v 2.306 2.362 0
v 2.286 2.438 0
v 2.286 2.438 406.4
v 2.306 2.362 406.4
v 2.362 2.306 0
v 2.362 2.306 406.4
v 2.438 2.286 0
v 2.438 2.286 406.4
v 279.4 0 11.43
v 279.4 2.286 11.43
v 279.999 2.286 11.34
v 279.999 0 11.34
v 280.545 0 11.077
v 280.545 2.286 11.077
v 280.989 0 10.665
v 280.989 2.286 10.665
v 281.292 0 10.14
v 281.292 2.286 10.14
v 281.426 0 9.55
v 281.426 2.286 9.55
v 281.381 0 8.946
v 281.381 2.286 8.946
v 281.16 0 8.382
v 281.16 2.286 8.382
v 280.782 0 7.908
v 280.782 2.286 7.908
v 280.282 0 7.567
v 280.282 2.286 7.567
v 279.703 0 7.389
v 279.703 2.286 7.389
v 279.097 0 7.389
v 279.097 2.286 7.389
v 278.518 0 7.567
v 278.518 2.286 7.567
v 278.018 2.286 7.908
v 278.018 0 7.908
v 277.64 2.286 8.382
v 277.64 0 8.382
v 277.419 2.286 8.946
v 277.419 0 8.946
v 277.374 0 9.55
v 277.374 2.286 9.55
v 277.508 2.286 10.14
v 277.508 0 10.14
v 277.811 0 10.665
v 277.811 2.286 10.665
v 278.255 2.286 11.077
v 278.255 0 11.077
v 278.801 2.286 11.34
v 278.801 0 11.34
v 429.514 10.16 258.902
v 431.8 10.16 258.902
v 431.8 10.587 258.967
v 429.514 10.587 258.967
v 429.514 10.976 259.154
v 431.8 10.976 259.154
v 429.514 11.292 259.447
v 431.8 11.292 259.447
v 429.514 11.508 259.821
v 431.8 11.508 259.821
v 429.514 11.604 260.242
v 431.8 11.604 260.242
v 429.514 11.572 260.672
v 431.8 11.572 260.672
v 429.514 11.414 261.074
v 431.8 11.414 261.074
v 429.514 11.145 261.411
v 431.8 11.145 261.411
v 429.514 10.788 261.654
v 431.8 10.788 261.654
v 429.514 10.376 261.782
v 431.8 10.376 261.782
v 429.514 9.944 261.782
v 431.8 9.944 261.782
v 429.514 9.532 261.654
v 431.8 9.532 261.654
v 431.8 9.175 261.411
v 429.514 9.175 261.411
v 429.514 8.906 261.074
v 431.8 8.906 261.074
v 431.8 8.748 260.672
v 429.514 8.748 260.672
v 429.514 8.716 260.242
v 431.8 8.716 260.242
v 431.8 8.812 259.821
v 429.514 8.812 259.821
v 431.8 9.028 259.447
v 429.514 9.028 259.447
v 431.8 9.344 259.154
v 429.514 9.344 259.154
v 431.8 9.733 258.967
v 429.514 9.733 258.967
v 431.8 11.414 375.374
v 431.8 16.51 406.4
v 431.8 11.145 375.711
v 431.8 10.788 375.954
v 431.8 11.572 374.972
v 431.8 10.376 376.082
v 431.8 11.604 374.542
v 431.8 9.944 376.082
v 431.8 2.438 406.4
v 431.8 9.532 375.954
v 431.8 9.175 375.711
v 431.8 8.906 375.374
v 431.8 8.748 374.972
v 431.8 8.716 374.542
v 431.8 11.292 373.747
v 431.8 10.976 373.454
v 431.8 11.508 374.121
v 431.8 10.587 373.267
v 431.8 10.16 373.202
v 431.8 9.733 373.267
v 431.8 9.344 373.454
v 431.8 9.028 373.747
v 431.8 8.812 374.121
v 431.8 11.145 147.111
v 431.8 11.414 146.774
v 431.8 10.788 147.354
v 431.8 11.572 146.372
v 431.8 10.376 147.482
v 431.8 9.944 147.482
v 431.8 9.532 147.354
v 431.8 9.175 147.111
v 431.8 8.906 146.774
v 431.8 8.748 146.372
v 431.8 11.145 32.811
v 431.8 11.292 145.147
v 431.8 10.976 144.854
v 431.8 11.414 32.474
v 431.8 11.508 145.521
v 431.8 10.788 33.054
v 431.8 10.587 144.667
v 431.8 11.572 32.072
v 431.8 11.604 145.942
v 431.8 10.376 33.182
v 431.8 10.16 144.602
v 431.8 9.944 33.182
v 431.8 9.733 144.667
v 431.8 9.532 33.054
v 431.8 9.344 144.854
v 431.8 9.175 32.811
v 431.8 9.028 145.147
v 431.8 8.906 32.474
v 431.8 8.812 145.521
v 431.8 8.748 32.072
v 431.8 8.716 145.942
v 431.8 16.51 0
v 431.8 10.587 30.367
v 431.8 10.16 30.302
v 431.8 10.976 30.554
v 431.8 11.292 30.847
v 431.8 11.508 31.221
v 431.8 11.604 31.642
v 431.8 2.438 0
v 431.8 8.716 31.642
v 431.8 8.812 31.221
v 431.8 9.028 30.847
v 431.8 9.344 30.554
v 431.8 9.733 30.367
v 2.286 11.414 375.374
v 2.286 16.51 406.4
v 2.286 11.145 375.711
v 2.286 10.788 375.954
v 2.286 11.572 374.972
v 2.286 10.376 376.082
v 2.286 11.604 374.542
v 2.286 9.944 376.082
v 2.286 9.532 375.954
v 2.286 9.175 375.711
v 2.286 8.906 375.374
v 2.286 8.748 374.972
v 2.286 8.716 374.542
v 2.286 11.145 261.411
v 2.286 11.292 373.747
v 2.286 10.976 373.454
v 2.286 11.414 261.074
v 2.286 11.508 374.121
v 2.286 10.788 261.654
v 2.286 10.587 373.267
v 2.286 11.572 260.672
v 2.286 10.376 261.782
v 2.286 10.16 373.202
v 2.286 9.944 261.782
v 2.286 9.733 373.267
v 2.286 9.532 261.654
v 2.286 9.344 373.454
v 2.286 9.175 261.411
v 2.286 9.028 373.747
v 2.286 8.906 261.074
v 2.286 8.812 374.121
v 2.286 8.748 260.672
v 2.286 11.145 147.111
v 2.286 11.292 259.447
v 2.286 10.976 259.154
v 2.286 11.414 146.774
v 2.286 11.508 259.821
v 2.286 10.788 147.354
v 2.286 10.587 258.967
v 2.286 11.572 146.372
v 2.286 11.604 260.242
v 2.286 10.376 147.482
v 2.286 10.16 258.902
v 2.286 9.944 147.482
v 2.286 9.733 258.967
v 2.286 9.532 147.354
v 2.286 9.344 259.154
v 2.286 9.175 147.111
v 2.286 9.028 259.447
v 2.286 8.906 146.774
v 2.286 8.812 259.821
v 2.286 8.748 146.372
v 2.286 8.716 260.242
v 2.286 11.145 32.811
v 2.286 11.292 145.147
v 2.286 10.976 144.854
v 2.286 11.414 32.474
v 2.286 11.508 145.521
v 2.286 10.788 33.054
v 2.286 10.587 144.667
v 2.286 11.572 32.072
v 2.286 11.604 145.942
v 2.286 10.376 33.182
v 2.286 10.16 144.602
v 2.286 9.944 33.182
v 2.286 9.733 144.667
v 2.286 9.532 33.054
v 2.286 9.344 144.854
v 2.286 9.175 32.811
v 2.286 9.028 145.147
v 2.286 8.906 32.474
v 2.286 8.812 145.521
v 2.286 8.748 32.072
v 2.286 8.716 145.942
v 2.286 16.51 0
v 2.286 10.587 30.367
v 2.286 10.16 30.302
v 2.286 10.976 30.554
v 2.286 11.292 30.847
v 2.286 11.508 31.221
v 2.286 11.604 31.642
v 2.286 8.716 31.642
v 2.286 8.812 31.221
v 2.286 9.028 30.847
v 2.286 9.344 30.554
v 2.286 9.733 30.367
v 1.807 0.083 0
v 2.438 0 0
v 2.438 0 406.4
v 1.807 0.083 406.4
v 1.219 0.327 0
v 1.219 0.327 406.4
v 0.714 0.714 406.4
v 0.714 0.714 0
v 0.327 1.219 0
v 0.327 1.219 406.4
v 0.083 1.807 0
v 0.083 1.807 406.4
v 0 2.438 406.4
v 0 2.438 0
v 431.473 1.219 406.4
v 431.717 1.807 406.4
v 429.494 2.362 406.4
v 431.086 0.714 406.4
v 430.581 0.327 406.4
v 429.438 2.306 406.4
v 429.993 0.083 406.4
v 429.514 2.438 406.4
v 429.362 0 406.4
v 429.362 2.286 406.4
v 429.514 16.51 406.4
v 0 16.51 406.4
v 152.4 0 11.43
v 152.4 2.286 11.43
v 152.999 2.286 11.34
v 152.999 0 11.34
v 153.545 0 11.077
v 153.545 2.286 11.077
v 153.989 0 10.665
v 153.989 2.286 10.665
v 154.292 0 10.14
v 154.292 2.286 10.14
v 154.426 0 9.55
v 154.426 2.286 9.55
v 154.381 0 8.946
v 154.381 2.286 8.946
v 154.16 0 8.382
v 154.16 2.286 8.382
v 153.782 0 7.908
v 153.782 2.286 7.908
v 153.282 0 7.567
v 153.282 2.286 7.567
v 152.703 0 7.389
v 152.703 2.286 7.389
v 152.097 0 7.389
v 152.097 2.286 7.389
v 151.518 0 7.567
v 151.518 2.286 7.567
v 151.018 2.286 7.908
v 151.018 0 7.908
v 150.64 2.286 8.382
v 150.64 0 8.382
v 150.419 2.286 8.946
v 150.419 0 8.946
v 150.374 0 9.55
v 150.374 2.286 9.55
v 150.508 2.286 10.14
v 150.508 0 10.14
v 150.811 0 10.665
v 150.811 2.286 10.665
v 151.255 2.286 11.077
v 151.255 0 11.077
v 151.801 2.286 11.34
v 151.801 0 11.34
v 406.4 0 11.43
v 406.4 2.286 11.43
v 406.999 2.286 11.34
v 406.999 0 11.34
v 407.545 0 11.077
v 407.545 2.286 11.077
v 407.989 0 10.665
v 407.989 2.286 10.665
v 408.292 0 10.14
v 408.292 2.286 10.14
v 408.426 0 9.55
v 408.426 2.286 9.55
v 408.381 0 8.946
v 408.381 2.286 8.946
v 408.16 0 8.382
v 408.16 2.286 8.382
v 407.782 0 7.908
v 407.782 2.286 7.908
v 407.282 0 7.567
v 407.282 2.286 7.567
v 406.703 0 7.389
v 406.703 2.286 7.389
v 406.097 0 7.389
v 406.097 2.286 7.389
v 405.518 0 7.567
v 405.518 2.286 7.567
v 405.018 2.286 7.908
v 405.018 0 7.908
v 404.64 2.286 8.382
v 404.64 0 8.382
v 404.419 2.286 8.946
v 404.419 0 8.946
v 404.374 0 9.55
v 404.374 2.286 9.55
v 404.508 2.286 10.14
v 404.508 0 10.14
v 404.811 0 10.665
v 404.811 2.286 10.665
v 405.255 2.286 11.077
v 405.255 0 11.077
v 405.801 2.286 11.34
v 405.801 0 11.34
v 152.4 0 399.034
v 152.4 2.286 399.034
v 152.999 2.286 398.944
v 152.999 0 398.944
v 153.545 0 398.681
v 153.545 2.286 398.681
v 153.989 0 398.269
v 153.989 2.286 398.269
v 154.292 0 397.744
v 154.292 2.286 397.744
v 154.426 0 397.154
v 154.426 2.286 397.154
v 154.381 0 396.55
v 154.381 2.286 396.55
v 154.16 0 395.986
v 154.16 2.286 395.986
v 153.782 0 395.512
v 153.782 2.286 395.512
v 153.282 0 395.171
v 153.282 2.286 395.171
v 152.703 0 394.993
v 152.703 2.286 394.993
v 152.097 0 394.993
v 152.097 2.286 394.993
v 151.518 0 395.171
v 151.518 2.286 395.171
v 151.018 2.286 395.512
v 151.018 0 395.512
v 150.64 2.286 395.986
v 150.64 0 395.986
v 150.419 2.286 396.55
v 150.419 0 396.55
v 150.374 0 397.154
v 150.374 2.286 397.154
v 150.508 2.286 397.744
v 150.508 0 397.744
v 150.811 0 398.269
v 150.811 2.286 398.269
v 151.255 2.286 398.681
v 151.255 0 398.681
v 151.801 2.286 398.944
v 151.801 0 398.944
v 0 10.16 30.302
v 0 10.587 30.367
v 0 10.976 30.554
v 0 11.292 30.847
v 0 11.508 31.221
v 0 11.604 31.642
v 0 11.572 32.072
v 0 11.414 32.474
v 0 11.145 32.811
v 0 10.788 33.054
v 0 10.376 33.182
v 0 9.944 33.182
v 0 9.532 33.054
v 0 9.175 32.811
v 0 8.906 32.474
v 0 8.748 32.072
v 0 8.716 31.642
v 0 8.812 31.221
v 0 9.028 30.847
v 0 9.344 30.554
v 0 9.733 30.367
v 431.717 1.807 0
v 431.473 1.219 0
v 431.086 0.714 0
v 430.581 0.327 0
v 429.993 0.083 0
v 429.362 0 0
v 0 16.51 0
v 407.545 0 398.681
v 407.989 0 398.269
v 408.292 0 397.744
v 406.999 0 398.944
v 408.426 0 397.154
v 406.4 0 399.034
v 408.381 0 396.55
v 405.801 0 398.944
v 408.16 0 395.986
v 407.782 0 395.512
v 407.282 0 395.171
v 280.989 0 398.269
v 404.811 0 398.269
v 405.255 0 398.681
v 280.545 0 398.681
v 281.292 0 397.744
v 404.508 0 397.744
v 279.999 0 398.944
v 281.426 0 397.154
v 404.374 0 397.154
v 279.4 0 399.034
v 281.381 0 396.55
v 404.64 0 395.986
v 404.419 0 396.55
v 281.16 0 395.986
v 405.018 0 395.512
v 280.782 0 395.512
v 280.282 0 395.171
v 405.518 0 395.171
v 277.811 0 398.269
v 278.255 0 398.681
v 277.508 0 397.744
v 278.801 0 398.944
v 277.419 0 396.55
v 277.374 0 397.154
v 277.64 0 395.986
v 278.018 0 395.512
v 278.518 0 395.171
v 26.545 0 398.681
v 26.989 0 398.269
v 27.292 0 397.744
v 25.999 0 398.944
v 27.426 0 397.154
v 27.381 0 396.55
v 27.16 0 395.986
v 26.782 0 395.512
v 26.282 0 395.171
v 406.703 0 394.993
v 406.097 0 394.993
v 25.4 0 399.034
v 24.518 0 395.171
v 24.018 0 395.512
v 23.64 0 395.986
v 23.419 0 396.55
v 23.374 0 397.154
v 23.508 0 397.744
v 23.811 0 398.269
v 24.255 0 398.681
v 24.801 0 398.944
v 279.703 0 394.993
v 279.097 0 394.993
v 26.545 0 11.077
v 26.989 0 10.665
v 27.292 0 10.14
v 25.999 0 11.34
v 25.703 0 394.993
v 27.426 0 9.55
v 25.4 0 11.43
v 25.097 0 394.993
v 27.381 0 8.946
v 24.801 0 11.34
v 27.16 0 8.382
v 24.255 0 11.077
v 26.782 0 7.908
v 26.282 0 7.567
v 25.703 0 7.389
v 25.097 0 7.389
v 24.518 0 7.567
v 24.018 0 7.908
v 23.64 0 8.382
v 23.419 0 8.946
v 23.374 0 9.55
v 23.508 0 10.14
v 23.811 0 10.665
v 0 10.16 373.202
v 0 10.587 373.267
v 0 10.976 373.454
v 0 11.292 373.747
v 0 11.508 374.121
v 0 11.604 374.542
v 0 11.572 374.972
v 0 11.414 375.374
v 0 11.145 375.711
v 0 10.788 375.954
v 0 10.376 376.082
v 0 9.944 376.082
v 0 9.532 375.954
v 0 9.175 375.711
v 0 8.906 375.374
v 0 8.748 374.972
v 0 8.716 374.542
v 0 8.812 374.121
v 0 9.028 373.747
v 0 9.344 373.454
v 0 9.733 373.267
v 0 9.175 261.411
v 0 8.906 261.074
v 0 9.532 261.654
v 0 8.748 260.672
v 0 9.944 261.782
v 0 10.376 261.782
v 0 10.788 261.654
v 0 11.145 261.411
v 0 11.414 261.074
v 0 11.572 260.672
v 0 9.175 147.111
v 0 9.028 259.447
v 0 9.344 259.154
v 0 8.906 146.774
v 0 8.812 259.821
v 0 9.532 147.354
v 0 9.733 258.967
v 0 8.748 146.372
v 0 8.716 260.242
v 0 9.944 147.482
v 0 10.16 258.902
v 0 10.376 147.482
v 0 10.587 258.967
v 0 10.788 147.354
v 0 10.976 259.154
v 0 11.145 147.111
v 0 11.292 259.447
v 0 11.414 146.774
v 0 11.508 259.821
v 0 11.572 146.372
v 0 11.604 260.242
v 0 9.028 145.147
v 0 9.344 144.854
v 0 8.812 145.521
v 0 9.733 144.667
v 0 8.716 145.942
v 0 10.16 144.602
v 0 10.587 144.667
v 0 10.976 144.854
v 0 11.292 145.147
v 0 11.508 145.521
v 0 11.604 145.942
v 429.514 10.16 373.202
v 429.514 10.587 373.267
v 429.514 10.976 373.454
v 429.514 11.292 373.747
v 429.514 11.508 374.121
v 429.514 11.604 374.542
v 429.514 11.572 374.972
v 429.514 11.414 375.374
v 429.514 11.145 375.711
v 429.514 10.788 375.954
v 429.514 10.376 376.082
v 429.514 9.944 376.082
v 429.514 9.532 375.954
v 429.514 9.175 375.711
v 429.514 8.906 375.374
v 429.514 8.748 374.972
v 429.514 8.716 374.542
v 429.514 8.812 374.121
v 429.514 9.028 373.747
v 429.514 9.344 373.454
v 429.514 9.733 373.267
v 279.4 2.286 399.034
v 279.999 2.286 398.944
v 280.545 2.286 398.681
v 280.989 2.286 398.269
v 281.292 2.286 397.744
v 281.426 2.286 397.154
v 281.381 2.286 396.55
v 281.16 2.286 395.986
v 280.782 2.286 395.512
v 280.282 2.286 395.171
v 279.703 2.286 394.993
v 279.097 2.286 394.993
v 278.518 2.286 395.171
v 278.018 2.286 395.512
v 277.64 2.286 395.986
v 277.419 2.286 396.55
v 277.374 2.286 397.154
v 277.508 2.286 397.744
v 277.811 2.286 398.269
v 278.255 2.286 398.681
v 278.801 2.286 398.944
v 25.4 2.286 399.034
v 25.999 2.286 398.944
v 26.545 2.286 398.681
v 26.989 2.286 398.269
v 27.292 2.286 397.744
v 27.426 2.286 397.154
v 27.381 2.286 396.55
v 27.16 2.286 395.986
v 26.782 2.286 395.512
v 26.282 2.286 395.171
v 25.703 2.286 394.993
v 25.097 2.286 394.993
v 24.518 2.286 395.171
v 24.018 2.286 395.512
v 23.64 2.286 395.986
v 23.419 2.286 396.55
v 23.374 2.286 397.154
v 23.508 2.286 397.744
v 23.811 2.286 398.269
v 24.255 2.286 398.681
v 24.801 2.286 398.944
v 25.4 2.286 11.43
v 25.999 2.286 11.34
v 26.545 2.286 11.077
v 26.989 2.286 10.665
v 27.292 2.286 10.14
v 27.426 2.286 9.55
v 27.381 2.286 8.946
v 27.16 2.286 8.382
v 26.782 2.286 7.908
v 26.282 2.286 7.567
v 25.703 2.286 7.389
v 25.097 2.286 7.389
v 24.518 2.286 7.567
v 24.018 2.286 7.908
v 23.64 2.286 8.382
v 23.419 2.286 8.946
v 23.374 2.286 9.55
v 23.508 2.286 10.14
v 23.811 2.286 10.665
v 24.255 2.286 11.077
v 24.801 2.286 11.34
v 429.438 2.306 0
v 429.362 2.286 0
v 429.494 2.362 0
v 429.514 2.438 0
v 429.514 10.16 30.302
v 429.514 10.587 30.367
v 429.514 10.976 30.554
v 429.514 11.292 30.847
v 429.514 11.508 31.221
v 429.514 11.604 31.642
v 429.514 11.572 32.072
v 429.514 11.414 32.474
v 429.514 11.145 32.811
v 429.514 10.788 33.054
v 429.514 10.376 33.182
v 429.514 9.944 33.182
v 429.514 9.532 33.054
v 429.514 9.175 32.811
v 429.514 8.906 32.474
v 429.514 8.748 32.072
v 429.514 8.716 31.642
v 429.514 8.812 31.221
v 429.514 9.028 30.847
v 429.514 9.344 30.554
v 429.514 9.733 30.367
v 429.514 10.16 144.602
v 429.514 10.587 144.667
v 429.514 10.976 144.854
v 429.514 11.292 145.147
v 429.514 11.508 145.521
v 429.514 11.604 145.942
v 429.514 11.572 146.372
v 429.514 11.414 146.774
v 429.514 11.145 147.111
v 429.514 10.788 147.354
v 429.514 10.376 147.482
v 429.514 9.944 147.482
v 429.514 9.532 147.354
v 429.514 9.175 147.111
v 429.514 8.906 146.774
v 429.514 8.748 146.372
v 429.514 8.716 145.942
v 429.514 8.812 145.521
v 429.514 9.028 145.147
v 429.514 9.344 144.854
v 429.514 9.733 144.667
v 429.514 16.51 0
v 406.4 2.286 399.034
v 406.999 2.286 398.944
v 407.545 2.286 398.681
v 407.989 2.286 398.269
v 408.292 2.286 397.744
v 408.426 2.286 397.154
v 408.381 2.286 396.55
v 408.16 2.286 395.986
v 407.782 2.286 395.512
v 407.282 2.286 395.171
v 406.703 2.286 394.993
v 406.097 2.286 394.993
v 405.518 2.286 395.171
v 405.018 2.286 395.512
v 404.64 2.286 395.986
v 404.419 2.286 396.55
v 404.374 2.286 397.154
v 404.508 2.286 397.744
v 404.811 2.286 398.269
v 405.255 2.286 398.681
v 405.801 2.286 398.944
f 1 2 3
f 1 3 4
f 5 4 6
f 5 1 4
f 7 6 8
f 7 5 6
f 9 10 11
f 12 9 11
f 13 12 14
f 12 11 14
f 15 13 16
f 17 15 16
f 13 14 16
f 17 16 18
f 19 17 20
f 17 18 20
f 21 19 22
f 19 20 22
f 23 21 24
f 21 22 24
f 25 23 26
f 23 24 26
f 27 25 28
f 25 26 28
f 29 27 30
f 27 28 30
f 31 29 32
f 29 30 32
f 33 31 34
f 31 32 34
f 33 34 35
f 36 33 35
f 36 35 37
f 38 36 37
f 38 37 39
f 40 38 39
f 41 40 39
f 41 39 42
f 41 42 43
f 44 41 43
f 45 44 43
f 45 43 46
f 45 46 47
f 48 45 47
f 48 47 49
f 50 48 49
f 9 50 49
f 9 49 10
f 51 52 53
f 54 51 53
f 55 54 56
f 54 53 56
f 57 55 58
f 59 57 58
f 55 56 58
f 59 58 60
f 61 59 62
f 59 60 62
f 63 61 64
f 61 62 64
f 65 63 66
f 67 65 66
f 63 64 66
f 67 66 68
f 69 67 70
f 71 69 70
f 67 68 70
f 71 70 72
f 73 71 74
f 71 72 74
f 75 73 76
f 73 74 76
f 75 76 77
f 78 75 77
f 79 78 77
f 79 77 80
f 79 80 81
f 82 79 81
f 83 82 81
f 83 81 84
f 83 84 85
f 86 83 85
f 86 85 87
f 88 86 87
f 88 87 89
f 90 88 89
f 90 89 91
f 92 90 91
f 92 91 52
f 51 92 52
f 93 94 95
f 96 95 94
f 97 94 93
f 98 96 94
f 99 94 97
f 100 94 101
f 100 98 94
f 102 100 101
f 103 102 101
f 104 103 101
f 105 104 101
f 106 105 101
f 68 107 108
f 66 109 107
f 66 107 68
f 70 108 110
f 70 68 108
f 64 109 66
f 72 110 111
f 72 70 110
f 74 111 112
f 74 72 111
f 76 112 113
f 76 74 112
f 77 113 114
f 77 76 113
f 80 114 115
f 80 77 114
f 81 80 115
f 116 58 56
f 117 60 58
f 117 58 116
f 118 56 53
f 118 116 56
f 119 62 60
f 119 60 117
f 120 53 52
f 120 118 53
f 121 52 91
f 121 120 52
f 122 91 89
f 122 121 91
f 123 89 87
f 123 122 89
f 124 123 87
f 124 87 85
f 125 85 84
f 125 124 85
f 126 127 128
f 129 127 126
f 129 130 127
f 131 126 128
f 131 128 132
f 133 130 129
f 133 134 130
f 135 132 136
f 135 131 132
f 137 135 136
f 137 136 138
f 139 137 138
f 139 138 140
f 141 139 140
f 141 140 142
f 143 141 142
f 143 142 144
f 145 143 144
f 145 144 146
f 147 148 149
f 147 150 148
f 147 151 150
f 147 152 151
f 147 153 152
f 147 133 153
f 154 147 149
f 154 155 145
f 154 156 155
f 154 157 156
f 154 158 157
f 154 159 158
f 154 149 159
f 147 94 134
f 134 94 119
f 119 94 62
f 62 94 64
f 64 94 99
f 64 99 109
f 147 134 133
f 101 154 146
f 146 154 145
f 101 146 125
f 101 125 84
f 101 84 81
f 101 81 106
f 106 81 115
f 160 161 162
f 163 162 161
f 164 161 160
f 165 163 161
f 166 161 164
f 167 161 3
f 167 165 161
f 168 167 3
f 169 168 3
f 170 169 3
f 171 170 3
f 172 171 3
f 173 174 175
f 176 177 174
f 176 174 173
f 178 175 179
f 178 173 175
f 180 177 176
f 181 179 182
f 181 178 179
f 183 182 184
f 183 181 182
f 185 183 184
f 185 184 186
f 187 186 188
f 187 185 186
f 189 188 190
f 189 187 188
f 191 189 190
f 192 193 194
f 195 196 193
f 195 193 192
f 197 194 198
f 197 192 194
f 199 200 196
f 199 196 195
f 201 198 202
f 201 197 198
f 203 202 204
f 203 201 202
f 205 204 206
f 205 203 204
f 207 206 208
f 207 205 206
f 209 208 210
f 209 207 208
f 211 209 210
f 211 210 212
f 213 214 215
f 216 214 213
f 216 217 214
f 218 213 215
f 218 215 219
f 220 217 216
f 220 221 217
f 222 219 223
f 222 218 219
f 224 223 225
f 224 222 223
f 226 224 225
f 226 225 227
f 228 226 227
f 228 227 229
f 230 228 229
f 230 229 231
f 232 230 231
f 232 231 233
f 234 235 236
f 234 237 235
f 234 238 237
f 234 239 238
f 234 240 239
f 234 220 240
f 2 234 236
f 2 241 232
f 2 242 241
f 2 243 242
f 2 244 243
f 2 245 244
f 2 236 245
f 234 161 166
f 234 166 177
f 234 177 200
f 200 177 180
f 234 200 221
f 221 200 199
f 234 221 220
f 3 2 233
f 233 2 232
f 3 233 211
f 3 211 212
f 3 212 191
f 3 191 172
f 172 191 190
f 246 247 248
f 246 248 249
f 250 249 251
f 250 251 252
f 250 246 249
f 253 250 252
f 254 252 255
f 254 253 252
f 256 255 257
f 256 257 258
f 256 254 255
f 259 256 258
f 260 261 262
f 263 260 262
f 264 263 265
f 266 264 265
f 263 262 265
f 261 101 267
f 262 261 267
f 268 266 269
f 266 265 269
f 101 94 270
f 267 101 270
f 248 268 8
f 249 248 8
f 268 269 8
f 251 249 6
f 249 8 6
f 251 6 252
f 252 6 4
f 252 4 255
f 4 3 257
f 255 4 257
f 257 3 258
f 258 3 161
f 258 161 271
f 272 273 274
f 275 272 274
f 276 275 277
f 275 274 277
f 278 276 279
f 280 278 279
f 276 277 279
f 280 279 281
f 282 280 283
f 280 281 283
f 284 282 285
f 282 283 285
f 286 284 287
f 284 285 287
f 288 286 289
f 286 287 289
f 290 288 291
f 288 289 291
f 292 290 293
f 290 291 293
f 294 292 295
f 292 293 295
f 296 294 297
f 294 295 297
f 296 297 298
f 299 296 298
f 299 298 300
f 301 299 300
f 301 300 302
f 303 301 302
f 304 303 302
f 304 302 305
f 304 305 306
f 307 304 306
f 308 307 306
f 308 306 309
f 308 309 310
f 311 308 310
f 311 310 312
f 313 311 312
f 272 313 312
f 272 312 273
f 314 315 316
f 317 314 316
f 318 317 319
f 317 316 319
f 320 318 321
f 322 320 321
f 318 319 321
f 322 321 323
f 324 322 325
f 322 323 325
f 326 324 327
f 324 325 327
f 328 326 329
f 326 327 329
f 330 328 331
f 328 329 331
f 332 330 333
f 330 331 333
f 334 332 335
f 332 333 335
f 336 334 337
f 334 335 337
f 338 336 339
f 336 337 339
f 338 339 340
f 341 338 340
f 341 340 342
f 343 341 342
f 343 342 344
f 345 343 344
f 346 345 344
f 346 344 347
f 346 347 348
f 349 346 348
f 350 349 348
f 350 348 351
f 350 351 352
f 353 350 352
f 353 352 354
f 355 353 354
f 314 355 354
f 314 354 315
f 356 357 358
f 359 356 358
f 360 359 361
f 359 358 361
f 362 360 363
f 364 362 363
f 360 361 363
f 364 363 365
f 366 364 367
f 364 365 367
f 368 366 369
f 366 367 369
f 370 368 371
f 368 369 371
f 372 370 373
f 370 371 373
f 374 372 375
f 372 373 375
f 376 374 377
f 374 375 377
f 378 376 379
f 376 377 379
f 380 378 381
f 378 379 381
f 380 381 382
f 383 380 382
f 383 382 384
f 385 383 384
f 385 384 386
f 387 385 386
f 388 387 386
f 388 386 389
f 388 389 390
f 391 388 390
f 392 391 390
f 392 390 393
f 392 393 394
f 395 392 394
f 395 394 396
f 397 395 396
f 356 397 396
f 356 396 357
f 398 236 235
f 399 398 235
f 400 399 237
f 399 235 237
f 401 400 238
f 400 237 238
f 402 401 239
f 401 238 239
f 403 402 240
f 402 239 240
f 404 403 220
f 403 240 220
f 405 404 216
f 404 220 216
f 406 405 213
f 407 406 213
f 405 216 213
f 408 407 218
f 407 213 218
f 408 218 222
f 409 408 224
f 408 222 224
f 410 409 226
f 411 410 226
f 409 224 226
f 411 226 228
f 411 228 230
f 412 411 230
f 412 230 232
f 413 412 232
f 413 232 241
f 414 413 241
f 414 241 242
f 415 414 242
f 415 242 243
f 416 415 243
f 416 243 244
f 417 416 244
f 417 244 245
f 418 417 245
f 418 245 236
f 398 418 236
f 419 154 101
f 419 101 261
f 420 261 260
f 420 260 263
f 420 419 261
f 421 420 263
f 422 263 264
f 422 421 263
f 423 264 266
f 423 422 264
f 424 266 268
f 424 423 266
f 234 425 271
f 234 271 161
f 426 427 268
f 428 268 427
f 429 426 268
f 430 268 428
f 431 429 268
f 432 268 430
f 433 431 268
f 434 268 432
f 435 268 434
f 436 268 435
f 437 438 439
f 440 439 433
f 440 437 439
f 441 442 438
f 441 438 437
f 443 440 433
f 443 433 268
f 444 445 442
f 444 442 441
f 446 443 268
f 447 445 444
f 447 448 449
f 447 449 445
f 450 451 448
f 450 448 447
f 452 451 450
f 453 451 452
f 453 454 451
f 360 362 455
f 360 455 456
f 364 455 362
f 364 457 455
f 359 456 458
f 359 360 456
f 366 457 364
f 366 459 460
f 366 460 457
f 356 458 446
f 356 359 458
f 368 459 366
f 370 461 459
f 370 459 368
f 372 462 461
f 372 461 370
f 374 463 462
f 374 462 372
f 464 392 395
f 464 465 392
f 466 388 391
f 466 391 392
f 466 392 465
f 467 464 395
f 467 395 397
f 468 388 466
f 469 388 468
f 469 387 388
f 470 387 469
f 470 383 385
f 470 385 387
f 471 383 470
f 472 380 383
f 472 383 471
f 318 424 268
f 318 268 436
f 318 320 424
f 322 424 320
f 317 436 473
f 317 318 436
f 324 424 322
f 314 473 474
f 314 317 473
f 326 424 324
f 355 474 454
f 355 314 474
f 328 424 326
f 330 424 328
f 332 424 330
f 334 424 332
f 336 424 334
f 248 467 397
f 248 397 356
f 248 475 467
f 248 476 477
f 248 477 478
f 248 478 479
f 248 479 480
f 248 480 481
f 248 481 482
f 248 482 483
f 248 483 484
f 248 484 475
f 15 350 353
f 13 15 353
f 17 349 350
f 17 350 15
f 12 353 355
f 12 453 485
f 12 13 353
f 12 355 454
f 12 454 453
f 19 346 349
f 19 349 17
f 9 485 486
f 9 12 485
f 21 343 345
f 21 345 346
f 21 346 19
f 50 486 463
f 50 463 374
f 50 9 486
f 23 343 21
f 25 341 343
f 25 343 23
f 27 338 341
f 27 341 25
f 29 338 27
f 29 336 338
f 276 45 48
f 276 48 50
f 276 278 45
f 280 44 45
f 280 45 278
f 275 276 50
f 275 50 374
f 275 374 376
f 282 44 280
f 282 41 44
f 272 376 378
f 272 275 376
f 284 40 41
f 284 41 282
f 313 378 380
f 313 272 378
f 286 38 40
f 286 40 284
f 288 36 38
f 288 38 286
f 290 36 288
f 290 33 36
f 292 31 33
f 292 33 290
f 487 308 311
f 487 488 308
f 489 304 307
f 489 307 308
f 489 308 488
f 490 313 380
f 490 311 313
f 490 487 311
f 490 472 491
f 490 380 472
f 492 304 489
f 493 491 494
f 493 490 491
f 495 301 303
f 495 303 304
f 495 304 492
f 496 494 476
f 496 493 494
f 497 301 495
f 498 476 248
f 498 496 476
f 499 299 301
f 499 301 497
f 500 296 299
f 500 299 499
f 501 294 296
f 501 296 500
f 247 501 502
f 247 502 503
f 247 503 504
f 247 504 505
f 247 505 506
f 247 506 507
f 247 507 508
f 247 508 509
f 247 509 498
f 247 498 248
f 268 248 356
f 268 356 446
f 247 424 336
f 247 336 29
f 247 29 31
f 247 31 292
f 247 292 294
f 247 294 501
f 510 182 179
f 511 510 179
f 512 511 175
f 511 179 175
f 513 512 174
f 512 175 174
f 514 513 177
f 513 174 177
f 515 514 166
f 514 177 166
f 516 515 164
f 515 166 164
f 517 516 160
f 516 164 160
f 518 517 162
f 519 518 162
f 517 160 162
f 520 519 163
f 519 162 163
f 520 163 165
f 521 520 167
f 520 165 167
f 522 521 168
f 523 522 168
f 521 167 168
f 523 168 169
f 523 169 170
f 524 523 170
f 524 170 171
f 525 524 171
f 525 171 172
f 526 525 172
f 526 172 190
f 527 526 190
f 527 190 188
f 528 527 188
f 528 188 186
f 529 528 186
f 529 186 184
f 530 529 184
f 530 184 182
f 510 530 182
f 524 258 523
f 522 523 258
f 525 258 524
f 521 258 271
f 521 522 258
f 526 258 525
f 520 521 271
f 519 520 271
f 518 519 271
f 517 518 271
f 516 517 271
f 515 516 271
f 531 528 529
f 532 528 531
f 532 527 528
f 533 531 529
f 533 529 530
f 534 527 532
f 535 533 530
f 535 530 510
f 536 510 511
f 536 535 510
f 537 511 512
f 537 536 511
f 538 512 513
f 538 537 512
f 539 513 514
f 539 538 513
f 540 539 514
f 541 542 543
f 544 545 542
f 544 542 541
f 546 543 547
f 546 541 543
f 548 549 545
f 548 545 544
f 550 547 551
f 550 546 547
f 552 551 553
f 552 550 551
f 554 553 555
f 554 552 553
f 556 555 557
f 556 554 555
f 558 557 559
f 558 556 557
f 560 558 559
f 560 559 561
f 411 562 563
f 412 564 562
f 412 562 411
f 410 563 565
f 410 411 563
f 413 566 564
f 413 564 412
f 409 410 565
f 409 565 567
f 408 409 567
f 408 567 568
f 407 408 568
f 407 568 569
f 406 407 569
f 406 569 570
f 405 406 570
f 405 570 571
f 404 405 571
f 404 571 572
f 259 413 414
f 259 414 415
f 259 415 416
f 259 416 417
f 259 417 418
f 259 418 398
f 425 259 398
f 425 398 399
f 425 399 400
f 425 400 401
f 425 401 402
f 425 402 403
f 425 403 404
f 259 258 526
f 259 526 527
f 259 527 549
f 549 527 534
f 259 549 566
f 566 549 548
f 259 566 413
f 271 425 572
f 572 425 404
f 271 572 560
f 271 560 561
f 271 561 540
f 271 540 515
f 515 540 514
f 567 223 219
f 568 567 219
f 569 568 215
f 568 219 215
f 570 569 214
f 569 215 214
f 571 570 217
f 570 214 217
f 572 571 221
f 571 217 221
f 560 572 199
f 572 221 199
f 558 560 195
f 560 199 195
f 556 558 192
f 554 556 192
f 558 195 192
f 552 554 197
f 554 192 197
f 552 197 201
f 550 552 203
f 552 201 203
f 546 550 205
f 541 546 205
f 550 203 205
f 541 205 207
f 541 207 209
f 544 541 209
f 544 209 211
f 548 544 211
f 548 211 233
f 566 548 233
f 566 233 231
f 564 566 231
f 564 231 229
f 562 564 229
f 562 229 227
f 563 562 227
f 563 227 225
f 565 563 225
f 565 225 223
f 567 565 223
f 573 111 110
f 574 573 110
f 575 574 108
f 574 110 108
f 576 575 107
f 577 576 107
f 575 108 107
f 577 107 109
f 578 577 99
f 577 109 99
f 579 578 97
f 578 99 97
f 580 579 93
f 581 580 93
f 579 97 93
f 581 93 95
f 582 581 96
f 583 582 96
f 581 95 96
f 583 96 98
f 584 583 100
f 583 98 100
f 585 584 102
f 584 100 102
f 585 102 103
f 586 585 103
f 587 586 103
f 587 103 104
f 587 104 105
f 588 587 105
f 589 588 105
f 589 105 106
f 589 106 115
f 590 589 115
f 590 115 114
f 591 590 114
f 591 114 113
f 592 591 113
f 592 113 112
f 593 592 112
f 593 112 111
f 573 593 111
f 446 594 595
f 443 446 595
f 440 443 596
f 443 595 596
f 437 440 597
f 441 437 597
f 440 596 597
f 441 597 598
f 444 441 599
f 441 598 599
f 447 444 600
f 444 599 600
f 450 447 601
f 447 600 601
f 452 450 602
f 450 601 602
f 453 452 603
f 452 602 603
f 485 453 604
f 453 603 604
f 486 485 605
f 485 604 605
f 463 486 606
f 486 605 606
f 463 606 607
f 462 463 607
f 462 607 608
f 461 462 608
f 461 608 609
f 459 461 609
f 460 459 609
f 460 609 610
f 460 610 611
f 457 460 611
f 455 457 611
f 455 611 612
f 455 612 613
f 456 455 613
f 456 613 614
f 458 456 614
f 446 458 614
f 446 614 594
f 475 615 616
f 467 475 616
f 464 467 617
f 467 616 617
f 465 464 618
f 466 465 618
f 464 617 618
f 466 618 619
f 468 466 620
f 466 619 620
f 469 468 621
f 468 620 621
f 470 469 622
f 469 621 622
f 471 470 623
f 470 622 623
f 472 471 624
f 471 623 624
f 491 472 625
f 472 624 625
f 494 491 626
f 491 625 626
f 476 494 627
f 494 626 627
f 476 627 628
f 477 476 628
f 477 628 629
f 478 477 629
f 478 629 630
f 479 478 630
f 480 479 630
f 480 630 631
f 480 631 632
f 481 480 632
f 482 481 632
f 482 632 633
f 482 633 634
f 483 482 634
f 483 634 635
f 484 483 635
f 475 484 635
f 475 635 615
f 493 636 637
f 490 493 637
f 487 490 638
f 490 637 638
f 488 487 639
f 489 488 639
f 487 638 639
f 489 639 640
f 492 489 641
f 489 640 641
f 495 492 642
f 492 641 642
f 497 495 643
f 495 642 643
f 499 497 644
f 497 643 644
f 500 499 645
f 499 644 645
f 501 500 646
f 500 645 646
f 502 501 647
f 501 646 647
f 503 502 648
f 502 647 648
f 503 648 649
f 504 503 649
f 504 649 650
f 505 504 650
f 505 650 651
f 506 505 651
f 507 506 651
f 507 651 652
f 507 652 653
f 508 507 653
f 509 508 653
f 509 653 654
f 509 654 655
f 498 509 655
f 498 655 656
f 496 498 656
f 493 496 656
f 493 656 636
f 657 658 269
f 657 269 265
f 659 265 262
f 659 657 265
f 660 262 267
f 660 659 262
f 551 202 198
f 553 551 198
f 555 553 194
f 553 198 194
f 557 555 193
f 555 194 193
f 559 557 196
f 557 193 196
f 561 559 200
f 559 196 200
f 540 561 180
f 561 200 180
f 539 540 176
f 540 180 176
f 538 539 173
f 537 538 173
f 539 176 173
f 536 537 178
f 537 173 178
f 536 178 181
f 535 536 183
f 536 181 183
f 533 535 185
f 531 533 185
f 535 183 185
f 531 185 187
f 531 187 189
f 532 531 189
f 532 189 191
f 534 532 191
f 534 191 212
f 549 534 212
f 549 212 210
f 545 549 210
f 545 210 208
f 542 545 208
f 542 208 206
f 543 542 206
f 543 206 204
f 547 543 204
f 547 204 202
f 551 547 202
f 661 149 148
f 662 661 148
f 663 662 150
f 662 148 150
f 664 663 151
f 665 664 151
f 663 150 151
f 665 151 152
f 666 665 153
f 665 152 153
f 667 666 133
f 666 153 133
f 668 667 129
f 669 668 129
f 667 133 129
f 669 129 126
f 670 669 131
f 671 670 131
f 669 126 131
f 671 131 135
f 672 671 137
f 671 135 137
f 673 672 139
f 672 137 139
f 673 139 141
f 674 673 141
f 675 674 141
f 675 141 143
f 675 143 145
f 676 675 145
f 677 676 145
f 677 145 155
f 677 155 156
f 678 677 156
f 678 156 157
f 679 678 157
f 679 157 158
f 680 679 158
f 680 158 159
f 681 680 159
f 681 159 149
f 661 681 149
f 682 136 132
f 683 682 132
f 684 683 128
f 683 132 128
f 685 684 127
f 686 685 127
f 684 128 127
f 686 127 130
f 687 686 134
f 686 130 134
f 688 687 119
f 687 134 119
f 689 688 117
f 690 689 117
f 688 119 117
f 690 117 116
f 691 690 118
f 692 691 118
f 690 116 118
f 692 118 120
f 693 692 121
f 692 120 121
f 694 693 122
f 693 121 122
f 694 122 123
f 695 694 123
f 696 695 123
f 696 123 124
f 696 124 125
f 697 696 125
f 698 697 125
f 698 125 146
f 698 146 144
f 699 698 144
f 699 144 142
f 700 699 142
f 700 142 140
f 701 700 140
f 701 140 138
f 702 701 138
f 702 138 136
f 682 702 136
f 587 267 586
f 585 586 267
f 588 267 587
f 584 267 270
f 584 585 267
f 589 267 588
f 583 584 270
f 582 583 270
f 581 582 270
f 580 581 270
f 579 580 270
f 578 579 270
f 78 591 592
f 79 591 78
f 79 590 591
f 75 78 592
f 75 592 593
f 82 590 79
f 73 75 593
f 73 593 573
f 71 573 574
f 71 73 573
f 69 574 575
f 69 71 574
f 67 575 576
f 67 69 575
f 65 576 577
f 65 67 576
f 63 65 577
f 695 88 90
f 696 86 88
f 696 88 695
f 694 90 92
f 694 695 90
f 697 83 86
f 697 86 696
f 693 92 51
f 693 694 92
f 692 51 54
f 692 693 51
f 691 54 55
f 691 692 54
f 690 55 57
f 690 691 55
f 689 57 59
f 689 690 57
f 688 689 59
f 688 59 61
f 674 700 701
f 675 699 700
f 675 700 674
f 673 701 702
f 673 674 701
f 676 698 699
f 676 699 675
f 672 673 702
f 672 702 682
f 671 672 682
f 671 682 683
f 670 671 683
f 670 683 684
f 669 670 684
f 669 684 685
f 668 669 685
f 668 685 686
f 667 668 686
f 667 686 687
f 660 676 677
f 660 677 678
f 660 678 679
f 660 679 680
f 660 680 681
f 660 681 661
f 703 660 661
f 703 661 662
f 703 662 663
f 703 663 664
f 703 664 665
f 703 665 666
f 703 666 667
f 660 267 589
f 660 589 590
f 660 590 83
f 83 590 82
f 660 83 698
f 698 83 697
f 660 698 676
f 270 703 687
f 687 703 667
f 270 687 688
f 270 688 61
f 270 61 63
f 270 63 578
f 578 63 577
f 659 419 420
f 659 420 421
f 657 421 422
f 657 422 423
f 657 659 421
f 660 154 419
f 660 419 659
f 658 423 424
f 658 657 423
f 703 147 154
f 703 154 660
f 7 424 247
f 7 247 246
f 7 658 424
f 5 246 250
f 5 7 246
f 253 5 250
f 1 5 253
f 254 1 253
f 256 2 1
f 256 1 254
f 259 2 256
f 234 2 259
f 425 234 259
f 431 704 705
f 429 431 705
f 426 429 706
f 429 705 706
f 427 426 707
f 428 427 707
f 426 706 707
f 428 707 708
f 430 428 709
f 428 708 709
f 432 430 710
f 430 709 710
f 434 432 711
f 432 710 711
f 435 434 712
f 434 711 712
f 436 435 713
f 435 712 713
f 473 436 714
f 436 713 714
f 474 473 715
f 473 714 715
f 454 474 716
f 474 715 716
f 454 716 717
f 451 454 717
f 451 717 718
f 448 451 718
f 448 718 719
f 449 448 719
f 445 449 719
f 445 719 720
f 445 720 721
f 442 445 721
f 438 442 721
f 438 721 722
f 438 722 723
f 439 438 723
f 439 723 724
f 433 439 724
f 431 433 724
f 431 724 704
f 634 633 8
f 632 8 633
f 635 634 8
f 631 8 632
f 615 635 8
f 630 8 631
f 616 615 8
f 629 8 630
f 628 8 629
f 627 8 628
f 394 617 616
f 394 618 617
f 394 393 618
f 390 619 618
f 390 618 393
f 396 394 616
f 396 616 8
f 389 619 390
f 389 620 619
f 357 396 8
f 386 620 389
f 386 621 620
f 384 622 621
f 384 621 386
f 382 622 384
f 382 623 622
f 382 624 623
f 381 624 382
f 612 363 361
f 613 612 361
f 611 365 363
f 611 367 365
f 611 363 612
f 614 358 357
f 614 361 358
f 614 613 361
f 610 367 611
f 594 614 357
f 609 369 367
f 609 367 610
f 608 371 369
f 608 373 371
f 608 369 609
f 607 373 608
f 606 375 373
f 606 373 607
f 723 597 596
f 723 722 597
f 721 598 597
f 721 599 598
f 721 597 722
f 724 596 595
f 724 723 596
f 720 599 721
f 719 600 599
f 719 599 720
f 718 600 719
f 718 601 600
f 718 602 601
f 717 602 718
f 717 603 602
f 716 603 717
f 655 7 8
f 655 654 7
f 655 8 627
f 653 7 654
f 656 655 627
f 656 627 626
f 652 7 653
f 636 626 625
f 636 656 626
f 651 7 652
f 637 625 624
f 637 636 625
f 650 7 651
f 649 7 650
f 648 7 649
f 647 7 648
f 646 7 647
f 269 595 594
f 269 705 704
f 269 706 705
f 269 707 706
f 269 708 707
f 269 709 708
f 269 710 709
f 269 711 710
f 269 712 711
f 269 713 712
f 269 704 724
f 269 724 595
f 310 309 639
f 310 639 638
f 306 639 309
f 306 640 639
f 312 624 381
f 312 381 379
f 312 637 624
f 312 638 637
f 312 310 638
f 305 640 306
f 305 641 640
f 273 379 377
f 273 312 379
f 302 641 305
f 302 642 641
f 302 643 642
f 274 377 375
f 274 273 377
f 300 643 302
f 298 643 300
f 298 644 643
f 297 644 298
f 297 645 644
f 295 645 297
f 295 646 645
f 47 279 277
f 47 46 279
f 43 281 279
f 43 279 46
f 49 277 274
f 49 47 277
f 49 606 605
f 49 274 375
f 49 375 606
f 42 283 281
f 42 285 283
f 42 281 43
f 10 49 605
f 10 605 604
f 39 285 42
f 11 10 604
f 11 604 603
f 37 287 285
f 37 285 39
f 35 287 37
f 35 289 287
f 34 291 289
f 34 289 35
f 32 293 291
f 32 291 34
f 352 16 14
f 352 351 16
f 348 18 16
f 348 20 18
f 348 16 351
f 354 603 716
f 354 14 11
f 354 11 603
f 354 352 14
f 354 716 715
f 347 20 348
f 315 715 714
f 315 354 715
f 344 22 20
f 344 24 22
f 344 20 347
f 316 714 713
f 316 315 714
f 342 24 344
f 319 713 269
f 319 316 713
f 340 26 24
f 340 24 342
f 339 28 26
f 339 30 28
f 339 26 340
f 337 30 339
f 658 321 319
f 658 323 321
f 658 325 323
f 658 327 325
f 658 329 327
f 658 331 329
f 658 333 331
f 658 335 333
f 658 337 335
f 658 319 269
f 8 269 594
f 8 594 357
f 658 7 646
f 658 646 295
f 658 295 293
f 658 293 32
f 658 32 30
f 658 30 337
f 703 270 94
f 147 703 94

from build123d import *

# Parameters (mm, degrees)
BASE_FLANGE3_DEPTH = 406.4
SKETCH10_R         = 1.4478
CUT_EXTRUDE3_DEPTH = 594.198769469
SKETCH11_R         = 2.032
CUT_EXTRUDE4_DEPTH = 594.139546967


# Sheet-metal steps are written as plain solids
with BuildPart() as part:
    # Sketch1 → Base-Flange3 (new body)
    with BuildSketch(Plane.XY):
        with BuildLine():
            Line((431.8, 16.51), (431.8, 2.4384))
            ThreePointArc((431.8, 2.4384), (431.085809175, 0.714190825), (429.3616, 0))
            Line((429.3616, 0), (2.4384, 0))
            ThreePointArc((2.4384, 0), (0.714190825, 0.714190825), (0, 2.4384))
            Line((0, 2.4384), (0, 16.51))
            Line((0, 16.51), (2.286, 16.51))
            Line((2.286, 16.51), (2.286, 2.4384))
            ThreePointArc((2.286, 2.4384), (2.330636927, 2.330636927), (2.4384, 2.286))
            Line((2.4384, 2.286), (429.3616, 2.286))
            ThreePointArc((429.3616, 2.286), (429.469363073, 2.330636927), (429.514, 2.4384))
            Line((429.514, 2.4384), (429.514, 16.51))
            Line((429.514, 16.51), (431.8, 16.51))
        make_face()
    extrude(amount=BASE_FLANGE3_DEPTH)

    # Sketch10 → Cut-Extrude3 (cut, through all)
    with BuildSketch(Plane(origin=(431.8, 0, 0), x_dir=(0, 0, -1), z_dir=(1, 0, 0))):
        with Locations((-31.75, 10.16)):
            Circle(SKETCH10_R)
        with Locations((-146.05, 10.16)):
            Circle(SKETCH10_R)
        with Locations((-260.35, 10.16)):
            Circle(SKETCH10_R)
        with Locations((-374.65, 10.16)):
            Circle(SKETCH10_R)
    extrude(amount=-CUT_EXTRUDE3_DEPTH, mode=Mode.SUBTRACT)

    # Sketch11 → Cut-Extrude4 (cut, through all)
    with BuildSketch(Plane(origin=(0, 2.286, 0), x_dir=(-1, 0, 0), z_dir=(0, 1, 0))):
        with Locations(Location((-406.4, 397.002, 0), (0, 0, 90))):
            Circle(SKETCH11_R)
        with Locations(Location((-279.4, 397.002, 0), (0, 0, 90))):
            Circle(SKETCH11_R)
        with Locations(Location((-152.4, 397.002, 0), (0, 0, 90))):
            Circle(SKETCH11_R)
        with Locations(Location((-25.4, 397.002, 0), (0, 0, 90))):
            Circle(SKETCH11_R)
        with Locations(Location((-406.4, 9.398, 0), (0, 0, 90))):
            Circle(SKETCH11_R)
        with Locations(Location((-279.4, 9.398, 0), (0, 0, 90))):
            Circle(SKETCH11_R)
        with Locations(Location((-152.4, 9.398, 0), (0, 0, 90))):
            Circle(SKETCH11_R)
        with Locations(Location((-25.4, 9.398, 0), (0, 0, 90))):
            Circle(SKETCH11_R)
    extrude(amount=-CUT_EXTRUDE4_DEPTH, mode=Mode.SUBTRACT)


solid = part.part
